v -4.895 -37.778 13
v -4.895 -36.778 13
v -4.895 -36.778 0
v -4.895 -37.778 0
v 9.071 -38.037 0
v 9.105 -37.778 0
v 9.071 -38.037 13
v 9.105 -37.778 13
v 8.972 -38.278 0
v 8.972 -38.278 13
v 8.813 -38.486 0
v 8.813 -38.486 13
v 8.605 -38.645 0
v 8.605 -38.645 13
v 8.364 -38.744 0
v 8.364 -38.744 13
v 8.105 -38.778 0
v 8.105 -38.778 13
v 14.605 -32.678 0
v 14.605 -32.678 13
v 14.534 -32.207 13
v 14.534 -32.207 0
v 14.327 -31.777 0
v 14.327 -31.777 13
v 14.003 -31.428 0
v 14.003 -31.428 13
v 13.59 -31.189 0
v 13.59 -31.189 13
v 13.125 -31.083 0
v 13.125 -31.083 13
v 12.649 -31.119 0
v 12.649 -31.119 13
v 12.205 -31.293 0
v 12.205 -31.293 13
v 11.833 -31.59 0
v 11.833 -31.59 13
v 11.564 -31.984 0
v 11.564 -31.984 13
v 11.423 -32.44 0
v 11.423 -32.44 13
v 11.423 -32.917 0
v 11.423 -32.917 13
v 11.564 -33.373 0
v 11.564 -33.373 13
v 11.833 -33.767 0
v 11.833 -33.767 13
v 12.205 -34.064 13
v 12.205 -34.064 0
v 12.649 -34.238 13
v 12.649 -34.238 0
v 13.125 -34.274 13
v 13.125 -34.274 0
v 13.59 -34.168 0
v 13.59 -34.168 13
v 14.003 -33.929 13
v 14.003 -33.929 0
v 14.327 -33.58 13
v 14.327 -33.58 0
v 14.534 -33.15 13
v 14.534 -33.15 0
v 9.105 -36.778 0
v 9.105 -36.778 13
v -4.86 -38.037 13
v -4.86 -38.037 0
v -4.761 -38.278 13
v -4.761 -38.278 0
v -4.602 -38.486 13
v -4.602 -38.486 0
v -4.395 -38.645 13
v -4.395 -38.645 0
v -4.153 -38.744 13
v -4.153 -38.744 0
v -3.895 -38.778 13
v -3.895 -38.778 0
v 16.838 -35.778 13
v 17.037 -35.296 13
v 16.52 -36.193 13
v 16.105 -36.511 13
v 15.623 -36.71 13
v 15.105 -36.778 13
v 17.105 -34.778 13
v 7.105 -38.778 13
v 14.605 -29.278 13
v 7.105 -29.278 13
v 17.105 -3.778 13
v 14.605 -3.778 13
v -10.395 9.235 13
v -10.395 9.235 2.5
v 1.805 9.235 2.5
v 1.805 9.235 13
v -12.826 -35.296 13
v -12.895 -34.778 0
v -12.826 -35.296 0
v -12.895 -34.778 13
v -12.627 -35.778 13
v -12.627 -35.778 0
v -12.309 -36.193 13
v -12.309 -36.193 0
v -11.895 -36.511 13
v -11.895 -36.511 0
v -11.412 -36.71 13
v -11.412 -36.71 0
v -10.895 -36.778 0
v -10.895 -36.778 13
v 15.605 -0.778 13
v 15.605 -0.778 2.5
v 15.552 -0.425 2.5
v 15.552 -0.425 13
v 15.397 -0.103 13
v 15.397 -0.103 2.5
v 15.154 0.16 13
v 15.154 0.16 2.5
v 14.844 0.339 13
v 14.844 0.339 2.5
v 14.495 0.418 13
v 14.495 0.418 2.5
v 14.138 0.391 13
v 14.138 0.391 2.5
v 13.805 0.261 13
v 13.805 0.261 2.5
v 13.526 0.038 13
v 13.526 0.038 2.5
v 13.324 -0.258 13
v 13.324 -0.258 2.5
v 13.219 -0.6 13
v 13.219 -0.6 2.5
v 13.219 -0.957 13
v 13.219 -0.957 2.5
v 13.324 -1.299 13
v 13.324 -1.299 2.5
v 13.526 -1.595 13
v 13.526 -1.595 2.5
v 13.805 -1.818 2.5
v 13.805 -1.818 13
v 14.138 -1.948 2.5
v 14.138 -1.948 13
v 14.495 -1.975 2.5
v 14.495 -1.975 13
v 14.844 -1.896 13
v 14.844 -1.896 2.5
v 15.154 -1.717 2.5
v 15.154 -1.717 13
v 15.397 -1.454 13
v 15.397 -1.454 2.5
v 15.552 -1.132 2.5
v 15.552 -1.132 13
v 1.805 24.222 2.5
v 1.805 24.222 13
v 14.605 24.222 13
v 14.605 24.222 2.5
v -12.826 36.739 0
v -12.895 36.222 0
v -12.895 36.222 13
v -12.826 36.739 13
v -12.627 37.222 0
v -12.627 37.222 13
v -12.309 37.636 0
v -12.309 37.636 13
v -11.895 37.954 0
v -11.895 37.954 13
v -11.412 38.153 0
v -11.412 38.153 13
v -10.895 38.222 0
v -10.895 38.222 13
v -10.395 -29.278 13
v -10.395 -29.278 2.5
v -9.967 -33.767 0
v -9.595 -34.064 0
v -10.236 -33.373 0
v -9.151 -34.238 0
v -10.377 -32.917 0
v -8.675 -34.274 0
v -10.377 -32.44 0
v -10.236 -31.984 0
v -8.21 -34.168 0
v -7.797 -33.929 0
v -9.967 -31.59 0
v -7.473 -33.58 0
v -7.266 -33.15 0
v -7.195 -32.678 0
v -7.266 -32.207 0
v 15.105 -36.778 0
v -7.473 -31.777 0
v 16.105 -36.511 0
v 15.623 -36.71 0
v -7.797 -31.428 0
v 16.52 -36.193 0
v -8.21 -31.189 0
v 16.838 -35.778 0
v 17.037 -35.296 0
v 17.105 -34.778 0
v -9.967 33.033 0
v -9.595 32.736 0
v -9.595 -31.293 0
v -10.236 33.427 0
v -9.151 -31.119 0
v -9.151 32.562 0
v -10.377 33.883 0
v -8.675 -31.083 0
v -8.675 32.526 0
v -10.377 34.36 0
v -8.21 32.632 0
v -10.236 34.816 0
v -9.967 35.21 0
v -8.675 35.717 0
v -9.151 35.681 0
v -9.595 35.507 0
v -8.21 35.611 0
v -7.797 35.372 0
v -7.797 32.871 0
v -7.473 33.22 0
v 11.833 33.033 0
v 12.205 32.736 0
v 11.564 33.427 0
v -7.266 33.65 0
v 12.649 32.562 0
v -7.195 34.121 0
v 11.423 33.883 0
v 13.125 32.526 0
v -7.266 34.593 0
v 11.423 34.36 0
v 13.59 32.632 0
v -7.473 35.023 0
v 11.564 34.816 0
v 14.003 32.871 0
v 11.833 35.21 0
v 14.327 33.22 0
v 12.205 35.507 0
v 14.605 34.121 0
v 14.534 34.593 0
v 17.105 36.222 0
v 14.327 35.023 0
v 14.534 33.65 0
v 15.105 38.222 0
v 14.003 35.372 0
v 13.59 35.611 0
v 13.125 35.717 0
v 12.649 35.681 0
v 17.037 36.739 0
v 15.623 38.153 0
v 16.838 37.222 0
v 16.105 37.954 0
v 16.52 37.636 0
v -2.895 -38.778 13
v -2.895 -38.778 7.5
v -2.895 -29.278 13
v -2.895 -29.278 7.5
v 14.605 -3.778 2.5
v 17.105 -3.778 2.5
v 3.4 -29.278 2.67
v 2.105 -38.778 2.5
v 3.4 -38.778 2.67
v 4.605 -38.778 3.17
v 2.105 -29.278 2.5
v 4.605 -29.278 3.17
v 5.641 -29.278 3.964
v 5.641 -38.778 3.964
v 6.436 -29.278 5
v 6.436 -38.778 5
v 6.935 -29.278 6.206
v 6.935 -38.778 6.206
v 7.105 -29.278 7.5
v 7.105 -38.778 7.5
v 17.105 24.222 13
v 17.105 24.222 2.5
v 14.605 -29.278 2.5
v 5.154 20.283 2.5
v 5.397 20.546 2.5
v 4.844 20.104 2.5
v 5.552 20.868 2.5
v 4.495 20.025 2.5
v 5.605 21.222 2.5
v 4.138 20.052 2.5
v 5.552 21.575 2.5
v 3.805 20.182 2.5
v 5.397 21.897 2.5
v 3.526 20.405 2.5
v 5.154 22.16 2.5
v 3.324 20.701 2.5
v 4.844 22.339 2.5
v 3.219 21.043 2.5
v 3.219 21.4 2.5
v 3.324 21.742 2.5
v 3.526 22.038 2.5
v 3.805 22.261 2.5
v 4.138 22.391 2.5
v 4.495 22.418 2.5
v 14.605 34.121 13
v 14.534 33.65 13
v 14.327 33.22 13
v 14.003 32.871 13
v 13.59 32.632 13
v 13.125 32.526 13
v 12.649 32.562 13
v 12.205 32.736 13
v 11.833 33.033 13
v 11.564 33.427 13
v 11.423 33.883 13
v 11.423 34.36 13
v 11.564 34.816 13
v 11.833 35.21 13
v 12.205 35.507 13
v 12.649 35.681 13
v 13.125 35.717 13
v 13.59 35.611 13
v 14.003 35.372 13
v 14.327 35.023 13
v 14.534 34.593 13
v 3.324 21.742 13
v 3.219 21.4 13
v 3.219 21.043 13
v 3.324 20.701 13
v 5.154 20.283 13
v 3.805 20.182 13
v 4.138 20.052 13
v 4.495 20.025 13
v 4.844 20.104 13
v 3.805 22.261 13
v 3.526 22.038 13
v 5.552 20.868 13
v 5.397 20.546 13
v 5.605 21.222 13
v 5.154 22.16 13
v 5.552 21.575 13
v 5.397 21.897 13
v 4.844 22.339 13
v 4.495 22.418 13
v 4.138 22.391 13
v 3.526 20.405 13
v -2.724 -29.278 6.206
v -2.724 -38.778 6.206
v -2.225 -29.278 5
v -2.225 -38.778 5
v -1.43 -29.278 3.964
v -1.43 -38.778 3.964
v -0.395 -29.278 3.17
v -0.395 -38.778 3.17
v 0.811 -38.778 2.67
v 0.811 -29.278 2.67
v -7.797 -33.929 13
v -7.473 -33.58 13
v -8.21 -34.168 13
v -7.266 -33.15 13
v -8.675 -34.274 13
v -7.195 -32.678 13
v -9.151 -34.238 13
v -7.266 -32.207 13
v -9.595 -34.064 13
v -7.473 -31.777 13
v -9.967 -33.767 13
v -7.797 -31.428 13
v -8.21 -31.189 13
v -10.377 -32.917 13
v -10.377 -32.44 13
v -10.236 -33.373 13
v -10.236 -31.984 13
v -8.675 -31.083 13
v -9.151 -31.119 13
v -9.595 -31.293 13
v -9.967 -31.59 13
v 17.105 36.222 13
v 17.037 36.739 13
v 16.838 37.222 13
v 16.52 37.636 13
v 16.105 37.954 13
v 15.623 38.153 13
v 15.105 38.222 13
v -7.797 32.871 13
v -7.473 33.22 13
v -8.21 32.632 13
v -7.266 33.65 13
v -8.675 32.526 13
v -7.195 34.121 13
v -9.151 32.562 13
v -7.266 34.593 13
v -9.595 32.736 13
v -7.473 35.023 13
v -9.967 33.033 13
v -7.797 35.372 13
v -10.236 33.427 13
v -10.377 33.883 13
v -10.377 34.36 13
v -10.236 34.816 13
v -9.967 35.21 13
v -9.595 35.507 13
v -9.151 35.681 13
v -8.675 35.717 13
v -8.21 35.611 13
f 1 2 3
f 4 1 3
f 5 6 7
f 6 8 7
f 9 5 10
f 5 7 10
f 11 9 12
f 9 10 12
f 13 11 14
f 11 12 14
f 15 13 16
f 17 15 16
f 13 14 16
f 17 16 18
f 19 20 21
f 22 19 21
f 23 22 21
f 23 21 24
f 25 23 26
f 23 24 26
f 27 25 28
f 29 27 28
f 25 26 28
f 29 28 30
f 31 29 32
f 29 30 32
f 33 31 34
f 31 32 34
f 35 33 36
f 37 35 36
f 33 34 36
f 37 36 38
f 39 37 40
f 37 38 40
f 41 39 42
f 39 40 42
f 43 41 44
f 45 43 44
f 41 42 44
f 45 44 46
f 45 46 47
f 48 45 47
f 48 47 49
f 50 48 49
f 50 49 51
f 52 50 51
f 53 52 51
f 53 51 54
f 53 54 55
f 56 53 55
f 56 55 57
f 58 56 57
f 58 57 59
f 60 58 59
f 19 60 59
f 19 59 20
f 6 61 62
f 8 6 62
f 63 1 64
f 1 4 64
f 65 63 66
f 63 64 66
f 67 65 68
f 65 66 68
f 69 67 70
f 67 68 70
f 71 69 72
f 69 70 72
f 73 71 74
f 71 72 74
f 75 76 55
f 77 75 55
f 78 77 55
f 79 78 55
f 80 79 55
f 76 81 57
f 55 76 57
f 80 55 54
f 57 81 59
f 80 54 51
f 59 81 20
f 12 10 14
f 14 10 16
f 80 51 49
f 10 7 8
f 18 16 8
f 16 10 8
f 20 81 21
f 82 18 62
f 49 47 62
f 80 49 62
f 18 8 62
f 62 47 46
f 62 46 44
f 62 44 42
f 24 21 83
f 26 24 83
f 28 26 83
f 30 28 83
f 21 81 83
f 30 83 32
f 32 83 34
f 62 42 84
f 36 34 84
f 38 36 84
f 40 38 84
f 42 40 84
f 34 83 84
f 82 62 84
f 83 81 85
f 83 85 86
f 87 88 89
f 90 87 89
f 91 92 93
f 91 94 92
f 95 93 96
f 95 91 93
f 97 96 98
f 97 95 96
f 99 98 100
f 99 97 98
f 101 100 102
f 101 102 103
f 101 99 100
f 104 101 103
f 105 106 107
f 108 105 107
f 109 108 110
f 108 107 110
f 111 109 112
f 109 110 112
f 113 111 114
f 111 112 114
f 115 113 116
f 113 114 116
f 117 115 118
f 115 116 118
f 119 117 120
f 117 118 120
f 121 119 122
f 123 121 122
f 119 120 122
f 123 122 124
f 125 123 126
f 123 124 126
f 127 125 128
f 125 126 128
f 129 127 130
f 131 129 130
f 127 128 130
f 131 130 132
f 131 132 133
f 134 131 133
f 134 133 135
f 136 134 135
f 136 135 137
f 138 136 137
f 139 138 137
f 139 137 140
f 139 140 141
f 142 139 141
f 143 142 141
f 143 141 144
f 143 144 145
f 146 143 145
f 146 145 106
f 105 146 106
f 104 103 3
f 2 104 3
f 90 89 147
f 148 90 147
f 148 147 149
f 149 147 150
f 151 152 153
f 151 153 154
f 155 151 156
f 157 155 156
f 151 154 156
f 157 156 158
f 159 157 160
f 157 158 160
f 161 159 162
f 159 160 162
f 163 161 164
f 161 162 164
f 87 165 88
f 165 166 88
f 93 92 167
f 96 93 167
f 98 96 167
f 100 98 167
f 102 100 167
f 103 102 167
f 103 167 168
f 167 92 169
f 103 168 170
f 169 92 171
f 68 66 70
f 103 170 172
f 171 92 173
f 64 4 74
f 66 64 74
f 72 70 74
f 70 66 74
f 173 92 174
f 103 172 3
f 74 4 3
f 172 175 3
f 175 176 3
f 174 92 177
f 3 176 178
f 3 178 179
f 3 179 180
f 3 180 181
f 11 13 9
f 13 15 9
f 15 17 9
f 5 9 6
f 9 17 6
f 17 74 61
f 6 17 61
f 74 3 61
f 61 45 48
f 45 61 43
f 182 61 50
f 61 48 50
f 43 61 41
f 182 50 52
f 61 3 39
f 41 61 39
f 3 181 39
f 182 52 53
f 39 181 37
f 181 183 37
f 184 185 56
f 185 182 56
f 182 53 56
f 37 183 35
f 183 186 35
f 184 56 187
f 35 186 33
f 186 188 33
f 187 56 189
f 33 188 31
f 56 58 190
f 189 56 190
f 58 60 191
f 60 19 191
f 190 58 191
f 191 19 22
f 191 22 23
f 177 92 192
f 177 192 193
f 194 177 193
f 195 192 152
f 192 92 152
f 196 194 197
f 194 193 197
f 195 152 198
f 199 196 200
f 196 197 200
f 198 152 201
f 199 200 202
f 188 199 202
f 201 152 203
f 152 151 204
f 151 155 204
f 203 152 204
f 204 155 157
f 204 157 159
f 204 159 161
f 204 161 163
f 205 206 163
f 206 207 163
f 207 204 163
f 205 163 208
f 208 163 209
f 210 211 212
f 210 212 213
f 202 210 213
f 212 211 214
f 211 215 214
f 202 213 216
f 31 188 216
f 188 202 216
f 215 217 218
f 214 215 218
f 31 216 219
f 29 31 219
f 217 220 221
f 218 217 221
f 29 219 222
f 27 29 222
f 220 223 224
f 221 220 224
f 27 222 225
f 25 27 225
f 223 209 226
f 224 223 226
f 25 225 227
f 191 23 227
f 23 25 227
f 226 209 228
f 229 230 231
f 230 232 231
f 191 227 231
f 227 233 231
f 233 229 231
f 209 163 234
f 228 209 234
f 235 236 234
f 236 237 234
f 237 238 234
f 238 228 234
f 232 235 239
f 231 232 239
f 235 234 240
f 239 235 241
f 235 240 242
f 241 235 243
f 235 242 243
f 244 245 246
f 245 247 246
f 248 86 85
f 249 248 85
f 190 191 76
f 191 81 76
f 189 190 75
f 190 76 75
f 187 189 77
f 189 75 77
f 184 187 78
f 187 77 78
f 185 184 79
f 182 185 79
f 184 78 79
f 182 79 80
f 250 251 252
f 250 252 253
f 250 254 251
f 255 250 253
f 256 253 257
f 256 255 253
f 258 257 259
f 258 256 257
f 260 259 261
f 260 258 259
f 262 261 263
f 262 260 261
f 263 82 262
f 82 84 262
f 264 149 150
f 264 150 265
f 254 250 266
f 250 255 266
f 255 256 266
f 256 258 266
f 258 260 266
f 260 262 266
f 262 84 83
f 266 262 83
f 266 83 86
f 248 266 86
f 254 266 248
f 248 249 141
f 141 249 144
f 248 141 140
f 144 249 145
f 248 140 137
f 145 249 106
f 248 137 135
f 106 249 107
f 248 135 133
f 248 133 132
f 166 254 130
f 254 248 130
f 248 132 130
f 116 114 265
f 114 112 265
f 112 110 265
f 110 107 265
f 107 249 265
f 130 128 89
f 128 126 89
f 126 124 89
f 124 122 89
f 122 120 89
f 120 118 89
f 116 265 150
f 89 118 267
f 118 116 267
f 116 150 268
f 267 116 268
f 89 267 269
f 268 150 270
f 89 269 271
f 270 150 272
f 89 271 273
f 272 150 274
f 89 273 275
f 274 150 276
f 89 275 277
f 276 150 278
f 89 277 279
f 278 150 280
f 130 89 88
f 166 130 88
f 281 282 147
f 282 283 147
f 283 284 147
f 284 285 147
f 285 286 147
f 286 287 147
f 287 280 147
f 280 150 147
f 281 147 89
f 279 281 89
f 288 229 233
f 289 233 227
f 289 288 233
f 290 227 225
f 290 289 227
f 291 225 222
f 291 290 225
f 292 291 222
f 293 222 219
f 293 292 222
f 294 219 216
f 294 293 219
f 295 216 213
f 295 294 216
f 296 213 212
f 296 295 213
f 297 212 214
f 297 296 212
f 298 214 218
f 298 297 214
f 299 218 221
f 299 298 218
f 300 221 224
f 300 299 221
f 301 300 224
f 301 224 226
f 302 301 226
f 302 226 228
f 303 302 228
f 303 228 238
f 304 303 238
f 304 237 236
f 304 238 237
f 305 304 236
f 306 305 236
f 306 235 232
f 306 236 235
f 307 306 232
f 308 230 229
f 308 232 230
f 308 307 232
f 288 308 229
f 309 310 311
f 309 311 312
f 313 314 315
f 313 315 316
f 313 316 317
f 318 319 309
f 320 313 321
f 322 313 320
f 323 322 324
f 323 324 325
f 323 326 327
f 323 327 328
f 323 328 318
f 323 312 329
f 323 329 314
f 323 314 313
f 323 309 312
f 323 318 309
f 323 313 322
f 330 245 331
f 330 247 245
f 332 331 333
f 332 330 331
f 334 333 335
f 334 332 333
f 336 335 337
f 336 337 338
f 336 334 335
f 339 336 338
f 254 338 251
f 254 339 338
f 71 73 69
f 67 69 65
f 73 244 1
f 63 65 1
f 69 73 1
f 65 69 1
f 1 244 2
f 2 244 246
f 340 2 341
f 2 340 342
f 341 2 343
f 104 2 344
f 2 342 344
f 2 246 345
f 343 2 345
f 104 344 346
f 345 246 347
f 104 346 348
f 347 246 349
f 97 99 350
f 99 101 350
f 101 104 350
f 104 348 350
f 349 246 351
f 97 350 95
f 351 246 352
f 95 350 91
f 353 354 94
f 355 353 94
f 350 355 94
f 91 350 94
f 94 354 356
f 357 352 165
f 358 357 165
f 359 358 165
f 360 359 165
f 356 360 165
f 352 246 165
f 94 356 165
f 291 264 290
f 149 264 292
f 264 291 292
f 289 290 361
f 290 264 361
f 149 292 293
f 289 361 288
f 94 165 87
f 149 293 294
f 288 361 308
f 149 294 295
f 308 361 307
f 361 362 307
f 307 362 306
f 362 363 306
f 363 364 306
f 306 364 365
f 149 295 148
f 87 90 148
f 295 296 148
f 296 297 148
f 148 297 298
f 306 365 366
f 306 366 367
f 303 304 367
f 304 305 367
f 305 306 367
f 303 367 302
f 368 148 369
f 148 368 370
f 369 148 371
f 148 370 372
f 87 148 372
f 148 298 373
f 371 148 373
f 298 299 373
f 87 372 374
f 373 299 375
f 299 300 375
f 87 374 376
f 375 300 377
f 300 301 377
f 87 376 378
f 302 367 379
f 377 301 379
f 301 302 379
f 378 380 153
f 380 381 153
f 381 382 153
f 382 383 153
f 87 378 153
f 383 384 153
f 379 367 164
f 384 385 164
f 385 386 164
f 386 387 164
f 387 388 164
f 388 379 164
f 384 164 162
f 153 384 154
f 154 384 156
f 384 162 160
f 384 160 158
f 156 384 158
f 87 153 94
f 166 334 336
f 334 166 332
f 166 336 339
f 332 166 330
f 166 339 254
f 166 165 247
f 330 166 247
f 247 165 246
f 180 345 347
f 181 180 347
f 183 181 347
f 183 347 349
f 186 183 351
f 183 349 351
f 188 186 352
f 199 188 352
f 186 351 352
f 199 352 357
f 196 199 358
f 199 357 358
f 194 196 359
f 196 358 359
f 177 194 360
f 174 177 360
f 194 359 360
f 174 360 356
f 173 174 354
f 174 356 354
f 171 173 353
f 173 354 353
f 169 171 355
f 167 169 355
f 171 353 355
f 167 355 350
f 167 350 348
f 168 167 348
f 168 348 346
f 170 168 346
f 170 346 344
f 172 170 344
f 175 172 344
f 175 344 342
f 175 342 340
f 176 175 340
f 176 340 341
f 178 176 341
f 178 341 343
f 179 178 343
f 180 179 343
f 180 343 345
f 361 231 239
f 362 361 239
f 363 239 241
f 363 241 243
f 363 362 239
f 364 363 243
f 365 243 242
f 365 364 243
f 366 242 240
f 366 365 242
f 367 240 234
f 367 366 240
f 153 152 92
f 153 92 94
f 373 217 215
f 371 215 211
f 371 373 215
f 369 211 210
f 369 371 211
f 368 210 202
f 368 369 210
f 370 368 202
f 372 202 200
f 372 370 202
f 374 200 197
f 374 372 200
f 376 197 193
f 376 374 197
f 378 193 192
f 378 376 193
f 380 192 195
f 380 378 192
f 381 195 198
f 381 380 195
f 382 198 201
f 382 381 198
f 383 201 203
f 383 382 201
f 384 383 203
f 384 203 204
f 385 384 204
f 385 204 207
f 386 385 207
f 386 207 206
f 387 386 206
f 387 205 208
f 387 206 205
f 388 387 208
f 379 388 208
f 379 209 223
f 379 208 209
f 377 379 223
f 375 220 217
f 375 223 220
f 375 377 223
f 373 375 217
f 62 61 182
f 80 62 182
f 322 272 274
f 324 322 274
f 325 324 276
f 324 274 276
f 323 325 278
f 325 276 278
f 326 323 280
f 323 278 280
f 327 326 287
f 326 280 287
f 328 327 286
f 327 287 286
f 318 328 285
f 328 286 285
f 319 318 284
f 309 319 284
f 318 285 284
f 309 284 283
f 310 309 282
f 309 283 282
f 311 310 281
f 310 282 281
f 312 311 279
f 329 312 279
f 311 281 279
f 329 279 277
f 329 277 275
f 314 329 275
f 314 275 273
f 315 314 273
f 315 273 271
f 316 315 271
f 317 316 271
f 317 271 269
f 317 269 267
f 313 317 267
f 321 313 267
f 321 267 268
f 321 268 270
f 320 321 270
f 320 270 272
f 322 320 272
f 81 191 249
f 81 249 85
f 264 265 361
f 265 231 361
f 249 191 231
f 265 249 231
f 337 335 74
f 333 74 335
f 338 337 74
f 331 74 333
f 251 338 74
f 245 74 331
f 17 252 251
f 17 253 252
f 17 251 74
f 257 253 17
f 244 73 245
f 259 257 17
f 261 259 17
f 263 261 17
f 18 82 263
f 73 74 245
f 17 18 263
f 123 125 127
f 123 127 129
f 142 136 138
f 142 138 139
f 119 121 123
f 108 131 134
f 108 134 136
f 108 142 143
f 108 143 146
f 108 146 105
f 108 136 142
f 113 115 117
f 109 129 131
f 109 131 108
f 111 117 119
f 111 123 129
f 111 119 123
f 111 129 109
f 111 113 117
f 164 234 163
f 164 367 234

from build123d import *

# Parameters (mm, degrees)
F0_W      = 30
F0_H      = 55
F1_DEPTH  = 13
F2_T      = -2.5
F3_W      = 2.5
F3_H      = 28
F4_DEPTH  = 10.5
F6_W      = 30
F6_H      = 13
F7_DEPTH  = 10
F9_R      = 2
F10_DEPTH = 10
F11_W     = 10
F11_H     = 7.5
F12_DEPTH = 10.5
F11_R     = 1.6
F13_DEPTH = 13.5
F5_W      = 12.8000527501
F5_H      = 1.513499856
F5_R      = 1.2
F14_DEPTH = 13
F16_R     = 2
F18_DEPTH = 2
F19_R     = 1
F20_R     = 4.99999


# Not quite as in the source:
# - a fillet or chamfer is up to 0.001 mm smaller than in the source, because OpenCascade refuses the exact size
# - a feature of the source that left no trace in its solid (it failed there, or was rolled back) is left out
# - a pattern or mirror of a feature is missing from the dataset's text; its kind, count and spacing are read off the source's solid
# - a feature names something its author has since deleted; it is built from what else it names


with BuildPart() as f1:
    # F0 (on Top) → F1 (new body)
    with BuildSketch(Plane.XY):
        with Locations((2.1054805815, 0.7215001613)):
            Rectangle(F0_W, F0_H)
    extrude(amount=F1_DEPTH)

    # F2
    f2_openings = [f1.faces().sort_by_distance(p)[0] for p in [
        (2.105481, 0.7215, 13),
    ]]
    offset(amount=F2_T, openings=f2_openings)

    # F3 (on face) → F4 (cut)
    with BuildSketch(Plane.XY.offset(13)):
        with Locations((15.8554805815, 10.2215001613)):
            Rectangle(F3_W, F3_H)
    extrude(amount=-F4_DEPTH, mode=Mode.SUBTRACT)

    # F6 (on face) → F7 (join)
    with BuildSketch(Plane(origin=(0, 28.2215001613, 0), x_dir=(-1, 0, 0), z_dir=(0, 1, 0))):
        with Locations((-2.1054805815, 6.5)):
            Rectangle(F6_W, F6_H)
    extrude(amount=F7_DEPTH)

    # F9
    f9_edges = [f1.edges().sort_by_distance(p)[0] for p in [
        (17.105481, 38.2215, 6.5),
        (-12.894519, 38.2215, 6.5),
    ]]
    fillet(f9_edges, radius=F9_R)

    # F10 (add): a face of the model
    f10_faces = [f1.faces().sort_by_distance(p)[0] for p in [
        (2.1054805815, -26.7784998387, 6.5),
    ]]
    extrude(f10_faces, amount=F10_DEPTH)

    # F11 (on face) → F12 (cut)
    with BuildSketch(Plane.XY.offset(13)):
        Polygon((14.6054805815, -24.2784998387), (-10.3945194185, -24.2784998387), (-10.3945194185, -29.2784998387), (-2.8945194185, -29.2784998387), (7.1054805815, -29.2784998387), (14.6054805815, -29.2784998387), align=None)
        with Locations((2.1054805815, -33.0284998387)):
            Rectangle(F11_W, F11_H)
    extrude(amount=-F12_DEPTH, mode=Mode.SUBTRACT)

    # F11 (on face) → F13 (cut)
    with BuildSketch(Plane.XY.offset(13)):
        with Locations((13.0054805815, -32.6784998387)):
            Circle(F11_R)
        with Locations((-8.7945194185, -32.6784998387)):
            Circle(F11_R)
    f13 = extrude(amount=-F13_DEPTH, mode=Mode.SUBTRACT)

    # F13_copies: F13 across plane
    add(f13.mirror(Plane.ZX.offset(0.7215)), mode=Mode.SUBTRACT)

    # F5 (on face) → F14 (join)
    with BuildSketch(Plane.XY):
        Polygon((1.8054805815, 25.7350058258), (-10.3945194185, 25.7350058258), (-10.3945194185, 9.2350058258), (1.8054805815, 9.2350058258), (1.8054805815, 24.2215059698), align=None)
        with Locations((8.2055069566, 24.9782558978)):
            Rectangle(F5_W, F5_H)
        with Locations((4.4054805815, 21.2215001613)):
            Circle(F5_R)
        with Locations((14.4054805815, -0.7784998387)):
            Circle(F5_R)
    extrude(amount=F14_DEPTH)

    # F16
    f16_edges = [f1.edges().sort_by_distance(p)[0] for p in [
        (17.105481, -36.7785, 6.5),
        (-12.894519, -36.7785, 6.5),
    ]]
    fillet(f16_edges, radius=F16_R)

    # F17 (on face) → F18 (join)
    with BuildSketch(Plane.XZ.offset(36.7784998387)):
        Polygon((-2.8945194185, 13), (-4.8945194185, 13), (-4.8945194185, 0), (9.1054805815, 0), (9.1054805815, 13), (7.1054805815, 13), (7.1054805815, 2.5), (-2.8945194185, 2.5), align=None)
    extrude(amount=F18_DEPTH)

    # F19
    f19_edges = [f1.edges().sort_by_distance(p)[0] for p in [
        (-4.894519, -38.7785, 6.5),
        (9.105481, -38.7785, 6.5),
    ]]
    fillet(f19_edges, radius=F19_R)

    # F20 (radius 5 in the source; OpenCascade refuses exactly that, so slightly less here)
    f20_edges = [f1.edges().sort_by_distance(p)[0] for p in [
        (-2.894519, -34.0285, 2.5),
        (7.105481, -34.0285, 2.5),
    ]]
    fillet(f20_edges, radius=F20_R)


solid = f1.part
